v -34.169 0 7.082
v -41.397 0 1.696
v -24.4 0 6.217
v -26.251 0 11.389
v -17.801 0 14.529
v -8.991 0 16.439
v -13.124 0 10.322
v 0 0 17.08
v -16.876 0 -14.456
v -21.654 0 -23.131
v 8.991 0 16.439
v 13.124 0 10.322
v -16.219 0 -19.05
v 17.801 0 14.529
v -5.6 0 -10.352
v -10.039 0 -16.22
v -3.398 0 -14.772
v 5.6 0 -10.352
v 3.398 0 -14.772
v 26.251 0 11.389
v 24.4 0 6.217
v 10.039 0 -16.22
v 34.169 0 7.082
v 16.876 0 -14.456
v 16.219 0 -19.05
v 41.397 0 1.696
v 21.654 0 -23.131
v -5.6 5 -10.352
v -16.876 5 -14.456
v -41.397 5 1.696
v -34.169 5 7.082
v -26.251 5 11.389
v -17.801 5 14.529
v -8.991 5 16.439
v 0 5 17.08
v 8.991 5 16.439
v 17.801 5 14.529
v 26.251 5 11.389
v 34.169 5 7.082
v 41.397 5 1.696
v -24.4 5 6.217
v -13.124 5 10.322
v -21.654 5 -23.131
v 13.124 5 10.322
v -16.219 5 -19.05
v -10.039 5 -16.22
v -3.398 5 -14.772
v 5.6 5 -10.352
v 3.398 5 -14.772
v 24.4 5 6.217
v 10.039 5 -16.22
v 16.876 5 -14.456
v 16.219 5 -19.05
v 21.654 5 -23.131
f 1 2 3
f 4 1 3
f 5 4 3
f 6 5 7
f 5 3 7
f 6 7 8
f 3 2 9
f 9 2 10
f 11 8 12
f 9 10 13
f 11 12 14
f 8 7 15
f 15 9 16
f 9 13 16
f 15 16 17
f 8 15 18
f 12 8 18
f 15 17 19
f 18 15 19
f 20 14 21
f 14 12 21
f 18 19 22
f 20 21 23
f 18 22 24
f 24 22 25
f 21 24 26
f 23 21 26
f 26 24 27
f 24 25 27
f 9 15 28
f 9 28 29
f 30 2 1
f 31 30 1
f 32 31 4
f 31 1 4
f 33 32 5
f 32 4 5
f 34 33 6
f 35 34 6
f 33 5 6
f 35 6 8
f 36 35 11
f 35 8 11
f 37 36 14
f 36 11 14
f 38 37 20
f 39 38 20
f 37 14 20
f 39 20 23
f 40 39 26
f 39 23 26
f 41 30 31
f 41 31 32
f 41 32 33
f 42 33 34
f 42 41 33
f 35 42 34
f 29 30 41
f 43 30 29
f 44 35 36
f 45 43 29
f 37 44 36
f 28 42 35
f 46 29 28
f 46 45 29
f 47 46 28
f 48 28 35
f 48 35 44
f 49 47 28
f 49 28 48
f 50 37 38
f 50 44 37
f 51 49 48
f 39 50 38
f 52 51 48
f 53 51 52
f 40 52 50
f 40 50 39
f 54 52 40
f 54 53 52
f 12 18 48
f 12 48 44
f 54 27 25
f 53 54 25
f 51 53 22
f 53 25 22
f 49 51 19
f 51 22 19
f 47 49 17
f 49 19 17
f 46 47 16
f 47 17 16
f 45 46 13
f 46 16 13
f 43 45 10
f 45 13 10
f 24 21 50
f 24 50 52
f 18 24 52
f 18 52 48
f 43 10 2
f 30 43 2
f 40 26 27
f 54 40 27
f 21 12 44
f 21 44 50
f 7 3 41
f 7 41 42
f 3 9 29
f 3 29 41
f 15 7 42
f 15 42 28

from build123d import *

# Parameters (mm, degrees)
EXTRUDE_1_DEPTH = 5


with BuildPart() as part:
    # 草图1 → 凸台-拉伸1 (new body)
    with BuildSketch(Plane(origin=(0, 0, 0), x_dir=(1, 0, 0), z_dir=(0, 1, 0))):
        with BuildLine():
            Line((-21.653867872, 23.131212261), (-41.397029955, -1.695585454))
            ThreePointArc((-41.397029955, -1.695585454), (0, -17.080137941), (41.397029955, -1.695585454))
            Line((41.397029955, -1.695585454), (21.653867872, 23.131212261))
            ThreePointArc((21.653867872, 23.131212261), (0, 14.589673731), (-21.653867872, 23.131212261))
        make_face()
        Polygon((-24.400377301, -6.217451313), (-13.124065852, -10.321693033), (-5.599622699, 10.351544624), (-16.875934148, 14.455786344), align=None, mode=Mode.SUBTRACT)
        Polygon((16.875934148, 14.455786344), (5.599622699, 10.351544624), (13.124065852, -10.321693033), (24.400377301, -6.217451313), align=None, mode=Mode.SUBTRACT)
    extrude(amount=EXTRUDE_1_DEPTH)


solid = part.part
